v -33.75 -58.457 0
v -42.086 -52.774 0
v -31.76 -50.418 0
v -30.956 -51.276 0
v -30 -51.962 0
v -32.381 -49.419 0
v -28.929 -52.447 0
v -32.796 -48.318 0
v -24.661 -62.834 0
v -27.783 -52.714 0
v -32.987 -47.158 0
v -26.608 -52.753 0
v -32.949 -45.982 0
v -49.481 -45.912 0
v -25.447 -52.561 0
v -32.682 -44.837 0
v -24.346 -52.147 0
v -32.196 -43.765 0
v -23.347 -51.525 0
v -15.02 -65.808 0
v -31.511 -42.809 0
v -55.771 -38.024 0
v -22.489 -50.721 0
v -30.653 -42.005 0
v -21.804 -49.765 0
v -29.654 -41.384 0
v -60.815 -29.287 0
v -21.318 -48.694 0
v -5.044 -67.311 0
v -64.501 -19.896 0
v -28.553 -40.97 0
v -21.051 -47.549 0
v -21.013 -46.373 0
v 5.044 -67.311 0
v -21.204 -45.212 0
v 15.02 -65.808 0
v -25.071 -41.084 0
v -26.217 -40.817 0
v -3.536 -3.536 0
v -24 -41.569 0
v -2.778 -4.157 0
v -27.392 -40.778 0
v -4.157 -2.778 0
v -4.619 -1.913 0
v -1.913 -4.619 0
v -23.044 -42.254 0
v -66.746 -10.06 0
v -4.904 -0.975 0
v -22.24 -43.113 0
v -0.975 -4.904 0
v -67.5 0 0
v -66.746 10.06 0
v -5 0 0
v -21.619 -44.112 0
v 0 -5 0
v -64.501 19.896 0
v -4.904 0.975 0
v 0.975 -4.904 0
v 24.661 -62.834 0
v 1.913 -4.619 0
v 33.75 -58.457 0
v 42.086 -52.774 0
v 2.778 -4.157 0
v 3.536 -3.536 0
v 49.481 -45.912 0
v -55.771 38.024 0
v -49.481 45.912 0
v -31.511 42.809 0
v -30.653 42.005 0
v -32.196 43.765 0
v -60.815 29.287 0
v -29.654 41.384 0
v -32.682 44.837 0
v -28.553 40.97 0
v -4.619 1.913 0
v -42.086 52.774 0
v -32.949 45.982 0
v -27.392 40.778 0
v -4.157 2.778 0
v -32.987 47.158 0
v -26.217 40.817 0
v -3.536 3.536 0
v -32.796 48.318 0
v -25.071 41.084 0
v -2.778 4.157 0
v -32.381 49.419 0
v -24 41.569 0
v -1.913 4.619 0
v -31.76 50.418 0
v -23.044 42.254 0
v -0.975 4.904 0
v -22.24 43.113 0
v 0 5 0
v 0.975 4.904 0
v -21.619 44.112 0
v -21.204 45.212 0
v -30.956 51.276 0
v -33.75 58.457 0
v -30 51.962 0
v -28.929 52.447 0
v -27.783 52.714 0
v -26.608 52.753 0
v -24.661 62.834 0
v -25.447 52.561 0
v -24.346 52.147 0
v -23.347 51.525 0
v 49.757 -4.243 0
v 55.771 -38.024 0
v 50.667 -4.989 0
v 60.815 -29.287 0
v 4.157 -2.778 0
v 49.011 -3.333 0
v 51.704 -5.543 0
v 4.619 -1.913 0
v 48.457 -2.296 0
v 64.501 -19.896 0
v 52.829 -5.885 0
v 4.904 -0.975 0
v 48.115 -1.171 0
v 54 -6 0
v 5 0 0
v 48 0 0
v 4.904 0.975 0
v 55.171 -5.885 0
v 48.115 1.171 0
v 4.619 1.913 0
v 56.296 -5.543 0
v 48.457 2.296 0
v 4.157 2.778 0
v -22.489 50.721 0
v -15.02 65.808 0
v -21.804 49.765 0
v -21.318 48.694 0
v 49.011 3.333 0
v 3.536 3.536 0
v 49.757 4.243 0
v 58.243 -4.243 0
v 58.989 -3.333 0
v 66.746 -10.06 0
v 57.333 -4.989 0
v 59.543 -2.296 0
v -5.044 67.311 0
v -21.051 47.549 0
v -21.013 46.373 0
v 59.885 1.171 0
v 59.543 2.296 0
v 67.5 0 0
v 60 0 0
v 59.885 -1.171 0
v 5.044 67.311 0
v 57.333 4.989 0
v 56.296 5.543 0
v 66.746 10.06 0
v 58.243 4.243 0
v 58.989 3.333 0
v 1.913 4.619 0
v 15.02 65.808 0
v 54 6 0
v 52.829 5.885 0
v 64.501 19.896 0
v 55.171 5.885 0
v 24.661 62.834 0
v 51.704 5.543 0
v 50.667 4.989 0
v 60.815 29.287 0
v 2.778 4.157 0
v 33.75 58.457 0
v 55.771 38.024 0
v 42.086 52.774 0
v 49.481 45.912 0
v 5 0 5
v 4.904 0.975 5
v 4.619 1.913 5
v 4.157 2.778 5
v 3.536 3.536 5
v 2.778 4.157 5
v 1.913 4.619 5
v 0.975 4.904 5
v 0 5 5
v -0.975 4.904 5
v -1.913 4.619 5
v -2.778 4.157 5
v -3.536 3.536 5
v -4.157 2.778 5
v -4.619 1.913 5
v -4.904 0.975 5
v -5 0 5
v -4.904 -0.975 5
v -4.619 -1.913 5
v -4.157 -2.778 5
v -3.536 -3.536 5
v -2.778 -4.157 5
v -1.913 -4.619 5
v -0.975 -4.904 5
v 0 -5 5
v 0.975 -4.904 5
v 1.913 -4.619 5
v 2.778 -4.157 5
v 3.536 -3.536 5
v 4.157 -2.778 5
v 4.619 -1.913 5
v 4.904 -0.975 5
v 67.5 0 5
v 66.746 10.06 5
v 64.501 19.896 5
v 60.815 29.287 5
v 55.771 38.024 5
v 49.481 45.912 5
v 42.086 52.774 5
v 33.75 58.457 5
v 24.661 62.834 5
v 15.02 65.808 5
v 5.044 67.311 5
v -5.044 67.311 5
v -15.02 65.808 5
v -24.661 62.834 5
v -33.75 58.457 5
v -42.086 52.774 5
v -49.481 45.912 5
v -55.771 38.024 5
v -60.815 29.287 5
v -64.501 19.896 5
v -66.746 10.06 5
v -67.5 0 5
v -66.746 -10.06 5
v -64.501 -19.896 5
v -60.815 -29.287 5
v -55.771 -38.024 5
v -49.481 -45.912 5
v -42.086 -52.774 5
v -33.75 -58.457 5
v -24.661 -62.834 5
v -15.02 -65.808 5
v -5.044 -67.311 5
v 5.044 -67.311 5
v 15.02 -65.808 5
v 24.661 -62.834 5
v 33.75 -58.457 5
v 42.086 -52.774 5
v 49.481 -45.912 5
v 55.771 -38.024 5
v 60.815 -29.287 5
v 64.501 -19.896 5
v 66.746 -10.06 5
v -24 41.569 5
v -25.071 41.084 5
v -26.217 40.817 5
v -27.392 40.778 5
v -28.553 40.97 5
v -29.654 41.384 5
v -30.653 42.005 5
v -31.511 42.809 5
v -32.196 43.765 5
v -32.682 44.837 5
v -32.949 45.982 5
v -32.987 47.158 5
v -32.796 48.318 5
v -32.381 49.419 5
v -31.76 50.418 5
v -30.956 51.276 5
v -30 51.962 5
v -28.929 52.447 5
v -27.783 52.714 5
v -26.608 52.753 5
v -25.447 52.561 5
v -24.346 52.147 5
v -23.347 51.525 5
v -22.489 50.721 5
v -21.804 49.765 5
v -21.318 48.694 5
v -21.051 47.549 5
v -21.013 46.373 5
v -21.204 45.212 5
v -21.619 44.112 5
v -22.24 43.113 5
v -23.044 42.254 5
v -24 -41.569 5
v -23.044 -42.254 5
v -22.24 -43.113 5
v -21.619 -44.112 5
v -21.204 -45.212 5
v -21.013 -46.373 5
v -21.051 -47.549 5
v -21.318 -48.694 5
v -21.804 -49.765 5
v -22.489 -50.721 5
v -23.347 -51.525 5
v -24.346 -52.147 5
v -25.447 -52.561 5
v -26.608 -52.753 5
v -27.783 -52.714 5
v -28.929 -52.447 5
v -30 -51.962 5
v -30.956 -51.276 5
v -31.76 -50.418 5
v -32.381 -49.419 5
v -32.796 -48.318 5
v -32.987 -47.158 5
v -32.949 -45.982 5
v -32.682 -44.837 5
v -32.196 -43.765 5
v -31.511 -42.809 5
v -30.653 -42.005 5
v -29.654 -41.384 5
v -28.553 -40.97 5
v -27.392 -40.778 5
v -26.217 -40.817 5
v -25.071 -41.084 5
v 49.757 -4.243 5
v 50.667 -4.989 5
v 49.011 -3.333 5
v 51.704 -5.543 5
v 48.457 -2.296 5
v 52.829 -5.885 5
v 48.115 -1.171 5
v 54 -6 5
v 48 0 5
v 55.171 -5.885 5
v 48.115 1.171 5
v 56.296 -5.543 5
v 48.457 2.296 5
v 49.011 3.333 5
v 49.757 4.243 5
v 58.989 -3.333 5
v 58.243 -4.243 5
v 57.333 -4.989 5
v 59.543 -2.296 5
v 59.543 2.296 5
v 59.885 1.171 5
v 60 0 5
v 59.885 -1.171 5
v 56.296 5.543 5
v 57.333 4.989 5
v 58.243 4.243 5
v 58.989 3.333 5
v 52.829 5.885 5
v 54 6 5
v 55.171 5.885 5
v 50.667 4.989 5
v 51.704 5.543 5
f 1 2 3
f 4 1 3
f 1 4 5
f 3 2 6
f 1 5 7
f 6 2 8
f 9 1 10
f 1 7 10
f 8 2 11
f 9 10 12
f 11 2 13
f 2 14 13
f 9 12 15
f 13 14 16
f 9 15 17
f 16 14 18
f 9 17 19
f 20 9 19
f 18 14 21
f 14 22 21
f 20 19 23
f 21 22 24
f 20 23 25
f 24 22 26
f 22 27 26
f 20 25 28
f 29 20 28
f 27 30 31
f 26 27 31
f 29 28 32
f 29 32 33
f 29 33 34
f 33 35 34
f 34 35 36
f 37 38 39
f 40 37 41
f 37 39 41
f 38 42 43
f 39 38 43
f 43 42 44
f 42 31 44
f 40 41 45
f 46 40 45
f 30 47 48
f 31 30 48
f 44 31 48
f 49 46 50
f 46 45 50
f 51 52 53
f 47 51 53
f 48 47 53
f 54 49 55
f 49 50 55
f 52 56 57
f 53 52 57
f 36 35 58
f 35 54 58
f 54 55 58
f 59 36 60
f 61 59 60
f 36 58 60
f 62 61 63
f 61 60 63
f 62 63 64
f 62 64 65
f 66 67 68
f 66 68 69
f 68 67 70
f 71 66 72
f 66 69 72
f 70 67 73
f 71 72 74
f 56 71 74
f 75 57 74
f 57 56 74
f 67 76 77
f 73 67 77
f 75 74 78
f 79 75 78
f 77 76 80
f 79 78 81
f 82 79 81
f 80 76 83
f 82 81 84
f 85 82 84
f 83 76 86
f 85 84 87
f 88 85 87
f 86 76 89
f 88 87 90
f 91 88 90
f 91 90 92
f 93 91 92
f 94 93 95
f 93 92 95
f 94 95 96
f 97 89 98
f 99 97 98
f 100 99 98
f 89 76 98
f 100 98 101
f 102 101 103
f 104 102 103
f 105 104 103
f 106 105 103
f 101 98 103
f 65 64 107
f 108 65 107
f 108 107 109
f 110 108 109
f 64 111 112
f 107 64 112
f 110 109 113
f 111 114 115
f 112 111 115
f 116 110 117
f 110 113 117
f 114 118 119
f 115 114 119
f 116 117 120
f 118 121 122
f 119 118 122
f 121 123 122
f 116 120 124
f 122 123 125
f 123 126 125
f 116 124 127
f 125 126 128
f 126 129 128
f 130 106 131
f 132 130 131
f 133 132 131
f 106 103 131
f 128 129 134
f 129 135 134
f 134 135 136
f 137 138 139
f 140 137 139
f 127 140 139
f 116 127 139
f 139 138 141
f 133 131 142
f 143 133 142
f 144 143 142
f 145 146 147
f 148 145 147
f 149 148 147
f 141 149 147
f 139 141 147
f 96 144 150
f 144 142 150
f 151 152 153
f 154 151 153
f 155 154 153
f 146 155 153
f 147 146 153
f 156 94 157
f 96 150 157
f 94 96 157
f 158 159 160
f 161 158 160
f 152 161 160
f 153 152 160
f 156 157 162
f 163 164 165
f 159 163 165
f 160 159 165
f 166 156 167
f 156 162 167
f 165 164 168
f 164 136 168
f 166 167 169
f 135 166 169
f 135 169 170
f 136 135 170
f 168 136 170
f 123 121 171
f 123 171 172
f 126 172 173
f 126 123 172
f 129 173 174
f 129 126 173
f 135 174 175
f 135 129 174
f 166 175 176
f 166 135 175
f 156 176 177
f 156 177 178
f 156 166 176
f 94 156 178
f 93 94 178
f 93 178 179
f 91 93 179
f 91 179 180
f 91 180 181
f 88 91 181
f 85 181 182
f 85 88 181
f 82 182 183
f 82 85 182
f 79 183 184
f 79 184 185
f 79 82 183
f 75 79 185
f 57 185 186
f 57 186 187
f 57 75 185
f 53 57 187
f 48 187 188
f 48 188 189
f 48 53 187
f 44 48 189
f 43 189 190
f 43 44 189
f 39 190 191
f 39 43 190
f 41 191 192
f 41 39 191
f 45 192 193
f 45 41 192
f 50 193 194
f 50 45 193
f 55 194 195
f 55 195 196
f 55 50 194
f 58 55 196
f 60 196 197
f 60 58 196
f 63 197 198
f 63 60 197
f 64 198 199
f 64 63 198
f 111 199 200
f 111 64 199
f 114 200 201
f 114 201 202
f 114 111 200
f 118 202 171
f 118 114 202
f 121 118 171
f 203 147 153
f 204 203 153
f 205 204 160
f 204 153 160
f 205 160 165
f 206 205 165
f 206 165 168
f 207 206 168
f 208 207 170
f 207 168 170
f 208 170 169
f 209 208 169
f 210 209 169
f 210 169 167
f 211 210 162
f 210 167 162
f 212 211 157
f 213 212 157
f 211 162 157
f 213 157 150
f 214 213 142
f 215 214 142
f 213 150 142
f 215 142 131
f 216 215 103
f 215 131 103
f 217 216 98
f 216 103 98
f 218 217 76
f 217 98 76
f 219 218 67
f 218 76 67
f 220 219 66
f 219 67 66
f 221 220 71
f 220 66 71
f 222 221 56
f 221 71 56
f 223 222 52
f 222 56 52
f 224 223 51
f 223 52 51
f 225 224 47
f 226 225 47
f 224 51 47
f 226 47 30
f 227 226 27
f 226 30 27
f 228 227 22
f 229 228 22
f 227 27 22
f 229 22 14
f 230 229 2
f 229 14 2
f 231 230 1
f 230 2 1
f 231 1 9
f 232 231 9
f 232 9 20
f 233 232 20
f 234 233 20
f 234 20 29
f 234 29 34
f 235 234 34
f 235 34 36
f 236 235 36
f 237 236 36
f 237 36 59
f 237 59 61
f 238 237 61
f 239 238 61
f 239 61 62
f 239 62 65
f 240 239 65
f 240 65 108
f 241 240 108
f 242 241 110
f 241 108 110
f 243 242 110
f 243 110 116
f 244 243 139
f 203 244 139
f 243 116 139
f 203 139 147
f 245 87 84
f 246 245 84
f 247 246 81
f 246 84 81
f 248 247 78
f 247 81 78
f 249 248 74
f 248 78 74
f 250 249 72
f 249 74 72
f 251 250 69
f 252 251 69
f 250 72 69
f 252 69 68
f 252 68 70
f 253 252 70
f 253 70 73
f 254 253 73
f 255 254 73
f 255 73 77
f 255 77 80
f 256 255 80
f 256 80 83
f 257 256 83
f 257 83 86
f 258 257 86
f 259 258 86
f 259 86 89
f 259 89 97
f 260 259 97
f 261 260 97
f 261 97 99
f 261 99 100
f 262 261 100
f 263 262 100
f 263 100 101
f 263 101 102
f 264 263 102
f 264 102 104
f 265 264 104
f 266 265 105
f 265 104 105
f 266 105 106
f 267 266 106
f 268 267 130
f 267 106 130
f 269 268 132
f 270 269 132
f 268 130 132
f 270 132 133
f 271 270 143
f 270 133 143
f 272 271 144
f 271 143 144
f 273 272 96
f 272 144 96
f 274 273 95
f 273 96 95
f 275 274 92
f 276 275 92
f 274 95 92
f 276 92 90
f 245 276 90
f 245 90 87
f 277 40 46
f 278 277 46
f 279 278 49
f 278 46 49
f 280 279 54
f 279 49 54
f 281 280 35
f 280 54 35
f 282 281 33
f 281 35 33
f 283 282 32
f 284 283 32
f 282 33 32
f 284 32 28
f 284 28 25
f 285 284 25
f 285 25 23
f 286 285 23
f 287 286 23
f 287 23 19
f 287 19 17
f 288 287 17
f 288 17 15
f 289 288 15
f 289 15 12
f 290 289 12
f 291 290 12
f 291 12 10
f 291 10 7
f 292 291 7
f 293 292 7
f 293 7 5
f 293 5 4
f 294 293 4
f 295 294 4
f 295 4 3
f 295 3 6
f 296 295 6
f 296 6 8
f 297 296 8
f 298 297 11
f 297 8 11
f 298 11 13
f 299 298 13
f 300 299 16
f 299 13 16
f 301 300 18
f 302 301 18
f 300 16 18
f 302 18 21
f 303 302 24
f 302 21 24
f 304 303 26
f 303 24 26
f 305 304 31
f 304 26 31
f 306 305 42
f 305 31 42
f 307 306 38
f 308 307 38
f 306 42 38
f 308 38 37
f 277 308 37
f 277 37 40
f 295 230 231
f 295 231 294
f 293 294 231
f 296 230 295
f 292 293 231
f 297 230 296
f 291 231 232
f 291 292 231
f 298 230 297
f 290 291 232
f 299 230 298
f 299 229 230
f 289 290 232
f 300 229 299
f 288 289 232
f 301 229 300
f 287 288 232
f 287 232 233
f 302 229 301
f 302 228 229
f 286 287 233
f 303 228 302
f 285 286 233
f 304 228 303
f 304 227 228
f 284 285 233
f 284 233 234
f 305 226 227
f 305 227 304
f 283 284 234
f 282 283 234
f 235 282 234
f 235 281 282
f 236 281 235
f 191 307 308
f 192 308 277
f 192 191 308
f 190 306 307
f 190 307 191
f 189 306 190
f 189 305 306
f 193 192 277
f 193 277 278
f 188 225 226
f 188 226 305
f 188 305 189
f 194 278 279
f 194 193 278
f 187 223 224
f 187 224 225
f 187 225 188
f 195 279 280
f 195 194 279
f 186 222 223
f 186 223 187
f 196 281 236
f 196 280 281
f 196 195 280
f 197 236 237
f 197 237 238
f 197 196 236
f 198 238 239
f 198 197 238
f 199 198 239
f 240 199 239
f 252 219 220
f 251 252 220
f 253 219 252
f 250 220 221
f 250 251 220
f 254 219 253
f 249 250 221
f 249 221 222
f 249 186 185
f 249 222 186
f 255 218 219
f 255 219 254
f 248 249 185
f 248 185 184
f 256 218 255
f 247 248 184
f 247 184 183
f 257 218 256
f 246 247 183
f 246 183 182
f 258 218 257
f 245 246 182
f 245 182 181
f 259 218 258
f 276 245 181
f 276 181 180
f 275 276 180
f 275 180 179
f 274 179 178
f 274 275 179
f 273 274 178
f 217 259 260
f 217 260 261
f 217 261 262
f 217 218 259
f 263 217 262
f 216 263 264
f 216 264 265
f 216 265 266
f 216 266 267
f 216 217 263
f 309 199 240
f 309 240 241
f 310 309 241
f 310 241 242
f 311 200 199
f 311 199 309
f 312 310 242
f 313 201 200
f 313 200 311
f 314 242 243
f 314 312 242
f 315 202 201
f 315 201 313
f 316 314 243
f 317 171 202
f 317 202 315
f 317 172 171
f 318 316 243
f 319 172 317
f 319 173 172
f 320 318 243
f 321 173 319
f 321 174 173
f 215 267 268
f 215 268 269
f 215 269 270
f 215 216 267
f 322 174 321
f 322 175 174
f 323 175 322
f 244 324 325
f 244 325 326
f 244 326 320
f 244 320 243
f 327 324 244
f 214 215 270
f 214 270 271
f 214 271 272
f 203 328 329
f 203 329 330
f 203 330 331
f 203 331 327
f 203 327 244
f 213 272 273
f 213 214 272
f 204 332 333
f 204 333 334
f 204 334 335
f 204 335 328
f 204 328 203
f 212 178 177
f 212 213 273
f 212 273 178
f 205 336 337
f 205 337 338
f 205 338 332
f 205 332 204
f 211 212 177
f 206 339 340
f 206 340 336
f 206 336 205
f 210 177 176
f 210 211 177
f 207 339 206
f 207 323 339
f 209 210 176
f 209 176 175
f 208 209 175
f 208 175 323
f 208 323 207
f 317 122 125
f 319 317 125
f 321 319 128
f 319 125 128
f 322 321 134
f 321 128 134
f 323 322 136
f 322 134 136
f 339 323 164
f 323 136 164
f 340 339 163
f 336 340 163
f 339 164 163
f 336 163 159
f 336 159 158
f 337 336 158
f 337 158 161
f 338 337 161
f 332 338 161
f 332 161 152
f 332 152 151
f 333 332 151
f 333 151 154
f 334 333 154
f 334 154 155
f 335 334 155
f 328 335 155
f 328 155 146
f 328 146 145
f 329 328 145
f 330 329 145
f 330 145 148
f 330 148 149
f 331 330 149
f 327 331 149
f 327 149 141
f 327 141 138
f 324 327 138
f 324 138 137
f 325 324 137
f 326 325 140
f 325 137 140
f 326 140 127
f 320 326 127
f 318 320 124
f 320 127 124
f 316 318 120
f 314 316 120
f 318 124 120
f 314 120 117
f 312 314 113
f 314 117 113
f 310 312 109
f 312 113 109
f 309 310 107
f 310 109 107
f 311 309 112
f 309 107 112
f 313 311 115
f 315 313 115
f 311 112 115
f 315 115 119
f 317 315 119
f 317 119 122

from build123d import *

# Parameters (mm, degrees)
F0_R            = 67.5
F0_R_2          = 5
F1_DEPTH        = 5
F3_D            = 12
F3_COPIES_COUNT = 3


# Not quite as in the source:
# - a pattern or mirror of a feature is missing from the dataset's text; its kind, count and spacing are read off the source's solid


with BuildPart() as f1:
    # F0 (on Top) → F1 (new body)
    with BuildSketch(Plane.XY):
        Circle(F0_R)
        Circle(F0_R_2, mode=Mode.SUBTRACT)
    extrude(amount=F1_DEPTH)

    # F3 (through all)
    with Locations(Plane.XY.offset(5)):
        with Locations((54, 0)):
            f3 = Hole(F3_D / 2)

    # F3_copies: F3 ×3 about axis
    f3_copies_axis = Axis((0, 0, 0), (0, 0, 1))
    for i in range(1, F3_COPIES_COUNT):
        add(f3.rotate(f3_copies_axis, i * 360 / F3_COPIES_COUNT), mode=Mode.SUBTRACT)


solid = f1.part
